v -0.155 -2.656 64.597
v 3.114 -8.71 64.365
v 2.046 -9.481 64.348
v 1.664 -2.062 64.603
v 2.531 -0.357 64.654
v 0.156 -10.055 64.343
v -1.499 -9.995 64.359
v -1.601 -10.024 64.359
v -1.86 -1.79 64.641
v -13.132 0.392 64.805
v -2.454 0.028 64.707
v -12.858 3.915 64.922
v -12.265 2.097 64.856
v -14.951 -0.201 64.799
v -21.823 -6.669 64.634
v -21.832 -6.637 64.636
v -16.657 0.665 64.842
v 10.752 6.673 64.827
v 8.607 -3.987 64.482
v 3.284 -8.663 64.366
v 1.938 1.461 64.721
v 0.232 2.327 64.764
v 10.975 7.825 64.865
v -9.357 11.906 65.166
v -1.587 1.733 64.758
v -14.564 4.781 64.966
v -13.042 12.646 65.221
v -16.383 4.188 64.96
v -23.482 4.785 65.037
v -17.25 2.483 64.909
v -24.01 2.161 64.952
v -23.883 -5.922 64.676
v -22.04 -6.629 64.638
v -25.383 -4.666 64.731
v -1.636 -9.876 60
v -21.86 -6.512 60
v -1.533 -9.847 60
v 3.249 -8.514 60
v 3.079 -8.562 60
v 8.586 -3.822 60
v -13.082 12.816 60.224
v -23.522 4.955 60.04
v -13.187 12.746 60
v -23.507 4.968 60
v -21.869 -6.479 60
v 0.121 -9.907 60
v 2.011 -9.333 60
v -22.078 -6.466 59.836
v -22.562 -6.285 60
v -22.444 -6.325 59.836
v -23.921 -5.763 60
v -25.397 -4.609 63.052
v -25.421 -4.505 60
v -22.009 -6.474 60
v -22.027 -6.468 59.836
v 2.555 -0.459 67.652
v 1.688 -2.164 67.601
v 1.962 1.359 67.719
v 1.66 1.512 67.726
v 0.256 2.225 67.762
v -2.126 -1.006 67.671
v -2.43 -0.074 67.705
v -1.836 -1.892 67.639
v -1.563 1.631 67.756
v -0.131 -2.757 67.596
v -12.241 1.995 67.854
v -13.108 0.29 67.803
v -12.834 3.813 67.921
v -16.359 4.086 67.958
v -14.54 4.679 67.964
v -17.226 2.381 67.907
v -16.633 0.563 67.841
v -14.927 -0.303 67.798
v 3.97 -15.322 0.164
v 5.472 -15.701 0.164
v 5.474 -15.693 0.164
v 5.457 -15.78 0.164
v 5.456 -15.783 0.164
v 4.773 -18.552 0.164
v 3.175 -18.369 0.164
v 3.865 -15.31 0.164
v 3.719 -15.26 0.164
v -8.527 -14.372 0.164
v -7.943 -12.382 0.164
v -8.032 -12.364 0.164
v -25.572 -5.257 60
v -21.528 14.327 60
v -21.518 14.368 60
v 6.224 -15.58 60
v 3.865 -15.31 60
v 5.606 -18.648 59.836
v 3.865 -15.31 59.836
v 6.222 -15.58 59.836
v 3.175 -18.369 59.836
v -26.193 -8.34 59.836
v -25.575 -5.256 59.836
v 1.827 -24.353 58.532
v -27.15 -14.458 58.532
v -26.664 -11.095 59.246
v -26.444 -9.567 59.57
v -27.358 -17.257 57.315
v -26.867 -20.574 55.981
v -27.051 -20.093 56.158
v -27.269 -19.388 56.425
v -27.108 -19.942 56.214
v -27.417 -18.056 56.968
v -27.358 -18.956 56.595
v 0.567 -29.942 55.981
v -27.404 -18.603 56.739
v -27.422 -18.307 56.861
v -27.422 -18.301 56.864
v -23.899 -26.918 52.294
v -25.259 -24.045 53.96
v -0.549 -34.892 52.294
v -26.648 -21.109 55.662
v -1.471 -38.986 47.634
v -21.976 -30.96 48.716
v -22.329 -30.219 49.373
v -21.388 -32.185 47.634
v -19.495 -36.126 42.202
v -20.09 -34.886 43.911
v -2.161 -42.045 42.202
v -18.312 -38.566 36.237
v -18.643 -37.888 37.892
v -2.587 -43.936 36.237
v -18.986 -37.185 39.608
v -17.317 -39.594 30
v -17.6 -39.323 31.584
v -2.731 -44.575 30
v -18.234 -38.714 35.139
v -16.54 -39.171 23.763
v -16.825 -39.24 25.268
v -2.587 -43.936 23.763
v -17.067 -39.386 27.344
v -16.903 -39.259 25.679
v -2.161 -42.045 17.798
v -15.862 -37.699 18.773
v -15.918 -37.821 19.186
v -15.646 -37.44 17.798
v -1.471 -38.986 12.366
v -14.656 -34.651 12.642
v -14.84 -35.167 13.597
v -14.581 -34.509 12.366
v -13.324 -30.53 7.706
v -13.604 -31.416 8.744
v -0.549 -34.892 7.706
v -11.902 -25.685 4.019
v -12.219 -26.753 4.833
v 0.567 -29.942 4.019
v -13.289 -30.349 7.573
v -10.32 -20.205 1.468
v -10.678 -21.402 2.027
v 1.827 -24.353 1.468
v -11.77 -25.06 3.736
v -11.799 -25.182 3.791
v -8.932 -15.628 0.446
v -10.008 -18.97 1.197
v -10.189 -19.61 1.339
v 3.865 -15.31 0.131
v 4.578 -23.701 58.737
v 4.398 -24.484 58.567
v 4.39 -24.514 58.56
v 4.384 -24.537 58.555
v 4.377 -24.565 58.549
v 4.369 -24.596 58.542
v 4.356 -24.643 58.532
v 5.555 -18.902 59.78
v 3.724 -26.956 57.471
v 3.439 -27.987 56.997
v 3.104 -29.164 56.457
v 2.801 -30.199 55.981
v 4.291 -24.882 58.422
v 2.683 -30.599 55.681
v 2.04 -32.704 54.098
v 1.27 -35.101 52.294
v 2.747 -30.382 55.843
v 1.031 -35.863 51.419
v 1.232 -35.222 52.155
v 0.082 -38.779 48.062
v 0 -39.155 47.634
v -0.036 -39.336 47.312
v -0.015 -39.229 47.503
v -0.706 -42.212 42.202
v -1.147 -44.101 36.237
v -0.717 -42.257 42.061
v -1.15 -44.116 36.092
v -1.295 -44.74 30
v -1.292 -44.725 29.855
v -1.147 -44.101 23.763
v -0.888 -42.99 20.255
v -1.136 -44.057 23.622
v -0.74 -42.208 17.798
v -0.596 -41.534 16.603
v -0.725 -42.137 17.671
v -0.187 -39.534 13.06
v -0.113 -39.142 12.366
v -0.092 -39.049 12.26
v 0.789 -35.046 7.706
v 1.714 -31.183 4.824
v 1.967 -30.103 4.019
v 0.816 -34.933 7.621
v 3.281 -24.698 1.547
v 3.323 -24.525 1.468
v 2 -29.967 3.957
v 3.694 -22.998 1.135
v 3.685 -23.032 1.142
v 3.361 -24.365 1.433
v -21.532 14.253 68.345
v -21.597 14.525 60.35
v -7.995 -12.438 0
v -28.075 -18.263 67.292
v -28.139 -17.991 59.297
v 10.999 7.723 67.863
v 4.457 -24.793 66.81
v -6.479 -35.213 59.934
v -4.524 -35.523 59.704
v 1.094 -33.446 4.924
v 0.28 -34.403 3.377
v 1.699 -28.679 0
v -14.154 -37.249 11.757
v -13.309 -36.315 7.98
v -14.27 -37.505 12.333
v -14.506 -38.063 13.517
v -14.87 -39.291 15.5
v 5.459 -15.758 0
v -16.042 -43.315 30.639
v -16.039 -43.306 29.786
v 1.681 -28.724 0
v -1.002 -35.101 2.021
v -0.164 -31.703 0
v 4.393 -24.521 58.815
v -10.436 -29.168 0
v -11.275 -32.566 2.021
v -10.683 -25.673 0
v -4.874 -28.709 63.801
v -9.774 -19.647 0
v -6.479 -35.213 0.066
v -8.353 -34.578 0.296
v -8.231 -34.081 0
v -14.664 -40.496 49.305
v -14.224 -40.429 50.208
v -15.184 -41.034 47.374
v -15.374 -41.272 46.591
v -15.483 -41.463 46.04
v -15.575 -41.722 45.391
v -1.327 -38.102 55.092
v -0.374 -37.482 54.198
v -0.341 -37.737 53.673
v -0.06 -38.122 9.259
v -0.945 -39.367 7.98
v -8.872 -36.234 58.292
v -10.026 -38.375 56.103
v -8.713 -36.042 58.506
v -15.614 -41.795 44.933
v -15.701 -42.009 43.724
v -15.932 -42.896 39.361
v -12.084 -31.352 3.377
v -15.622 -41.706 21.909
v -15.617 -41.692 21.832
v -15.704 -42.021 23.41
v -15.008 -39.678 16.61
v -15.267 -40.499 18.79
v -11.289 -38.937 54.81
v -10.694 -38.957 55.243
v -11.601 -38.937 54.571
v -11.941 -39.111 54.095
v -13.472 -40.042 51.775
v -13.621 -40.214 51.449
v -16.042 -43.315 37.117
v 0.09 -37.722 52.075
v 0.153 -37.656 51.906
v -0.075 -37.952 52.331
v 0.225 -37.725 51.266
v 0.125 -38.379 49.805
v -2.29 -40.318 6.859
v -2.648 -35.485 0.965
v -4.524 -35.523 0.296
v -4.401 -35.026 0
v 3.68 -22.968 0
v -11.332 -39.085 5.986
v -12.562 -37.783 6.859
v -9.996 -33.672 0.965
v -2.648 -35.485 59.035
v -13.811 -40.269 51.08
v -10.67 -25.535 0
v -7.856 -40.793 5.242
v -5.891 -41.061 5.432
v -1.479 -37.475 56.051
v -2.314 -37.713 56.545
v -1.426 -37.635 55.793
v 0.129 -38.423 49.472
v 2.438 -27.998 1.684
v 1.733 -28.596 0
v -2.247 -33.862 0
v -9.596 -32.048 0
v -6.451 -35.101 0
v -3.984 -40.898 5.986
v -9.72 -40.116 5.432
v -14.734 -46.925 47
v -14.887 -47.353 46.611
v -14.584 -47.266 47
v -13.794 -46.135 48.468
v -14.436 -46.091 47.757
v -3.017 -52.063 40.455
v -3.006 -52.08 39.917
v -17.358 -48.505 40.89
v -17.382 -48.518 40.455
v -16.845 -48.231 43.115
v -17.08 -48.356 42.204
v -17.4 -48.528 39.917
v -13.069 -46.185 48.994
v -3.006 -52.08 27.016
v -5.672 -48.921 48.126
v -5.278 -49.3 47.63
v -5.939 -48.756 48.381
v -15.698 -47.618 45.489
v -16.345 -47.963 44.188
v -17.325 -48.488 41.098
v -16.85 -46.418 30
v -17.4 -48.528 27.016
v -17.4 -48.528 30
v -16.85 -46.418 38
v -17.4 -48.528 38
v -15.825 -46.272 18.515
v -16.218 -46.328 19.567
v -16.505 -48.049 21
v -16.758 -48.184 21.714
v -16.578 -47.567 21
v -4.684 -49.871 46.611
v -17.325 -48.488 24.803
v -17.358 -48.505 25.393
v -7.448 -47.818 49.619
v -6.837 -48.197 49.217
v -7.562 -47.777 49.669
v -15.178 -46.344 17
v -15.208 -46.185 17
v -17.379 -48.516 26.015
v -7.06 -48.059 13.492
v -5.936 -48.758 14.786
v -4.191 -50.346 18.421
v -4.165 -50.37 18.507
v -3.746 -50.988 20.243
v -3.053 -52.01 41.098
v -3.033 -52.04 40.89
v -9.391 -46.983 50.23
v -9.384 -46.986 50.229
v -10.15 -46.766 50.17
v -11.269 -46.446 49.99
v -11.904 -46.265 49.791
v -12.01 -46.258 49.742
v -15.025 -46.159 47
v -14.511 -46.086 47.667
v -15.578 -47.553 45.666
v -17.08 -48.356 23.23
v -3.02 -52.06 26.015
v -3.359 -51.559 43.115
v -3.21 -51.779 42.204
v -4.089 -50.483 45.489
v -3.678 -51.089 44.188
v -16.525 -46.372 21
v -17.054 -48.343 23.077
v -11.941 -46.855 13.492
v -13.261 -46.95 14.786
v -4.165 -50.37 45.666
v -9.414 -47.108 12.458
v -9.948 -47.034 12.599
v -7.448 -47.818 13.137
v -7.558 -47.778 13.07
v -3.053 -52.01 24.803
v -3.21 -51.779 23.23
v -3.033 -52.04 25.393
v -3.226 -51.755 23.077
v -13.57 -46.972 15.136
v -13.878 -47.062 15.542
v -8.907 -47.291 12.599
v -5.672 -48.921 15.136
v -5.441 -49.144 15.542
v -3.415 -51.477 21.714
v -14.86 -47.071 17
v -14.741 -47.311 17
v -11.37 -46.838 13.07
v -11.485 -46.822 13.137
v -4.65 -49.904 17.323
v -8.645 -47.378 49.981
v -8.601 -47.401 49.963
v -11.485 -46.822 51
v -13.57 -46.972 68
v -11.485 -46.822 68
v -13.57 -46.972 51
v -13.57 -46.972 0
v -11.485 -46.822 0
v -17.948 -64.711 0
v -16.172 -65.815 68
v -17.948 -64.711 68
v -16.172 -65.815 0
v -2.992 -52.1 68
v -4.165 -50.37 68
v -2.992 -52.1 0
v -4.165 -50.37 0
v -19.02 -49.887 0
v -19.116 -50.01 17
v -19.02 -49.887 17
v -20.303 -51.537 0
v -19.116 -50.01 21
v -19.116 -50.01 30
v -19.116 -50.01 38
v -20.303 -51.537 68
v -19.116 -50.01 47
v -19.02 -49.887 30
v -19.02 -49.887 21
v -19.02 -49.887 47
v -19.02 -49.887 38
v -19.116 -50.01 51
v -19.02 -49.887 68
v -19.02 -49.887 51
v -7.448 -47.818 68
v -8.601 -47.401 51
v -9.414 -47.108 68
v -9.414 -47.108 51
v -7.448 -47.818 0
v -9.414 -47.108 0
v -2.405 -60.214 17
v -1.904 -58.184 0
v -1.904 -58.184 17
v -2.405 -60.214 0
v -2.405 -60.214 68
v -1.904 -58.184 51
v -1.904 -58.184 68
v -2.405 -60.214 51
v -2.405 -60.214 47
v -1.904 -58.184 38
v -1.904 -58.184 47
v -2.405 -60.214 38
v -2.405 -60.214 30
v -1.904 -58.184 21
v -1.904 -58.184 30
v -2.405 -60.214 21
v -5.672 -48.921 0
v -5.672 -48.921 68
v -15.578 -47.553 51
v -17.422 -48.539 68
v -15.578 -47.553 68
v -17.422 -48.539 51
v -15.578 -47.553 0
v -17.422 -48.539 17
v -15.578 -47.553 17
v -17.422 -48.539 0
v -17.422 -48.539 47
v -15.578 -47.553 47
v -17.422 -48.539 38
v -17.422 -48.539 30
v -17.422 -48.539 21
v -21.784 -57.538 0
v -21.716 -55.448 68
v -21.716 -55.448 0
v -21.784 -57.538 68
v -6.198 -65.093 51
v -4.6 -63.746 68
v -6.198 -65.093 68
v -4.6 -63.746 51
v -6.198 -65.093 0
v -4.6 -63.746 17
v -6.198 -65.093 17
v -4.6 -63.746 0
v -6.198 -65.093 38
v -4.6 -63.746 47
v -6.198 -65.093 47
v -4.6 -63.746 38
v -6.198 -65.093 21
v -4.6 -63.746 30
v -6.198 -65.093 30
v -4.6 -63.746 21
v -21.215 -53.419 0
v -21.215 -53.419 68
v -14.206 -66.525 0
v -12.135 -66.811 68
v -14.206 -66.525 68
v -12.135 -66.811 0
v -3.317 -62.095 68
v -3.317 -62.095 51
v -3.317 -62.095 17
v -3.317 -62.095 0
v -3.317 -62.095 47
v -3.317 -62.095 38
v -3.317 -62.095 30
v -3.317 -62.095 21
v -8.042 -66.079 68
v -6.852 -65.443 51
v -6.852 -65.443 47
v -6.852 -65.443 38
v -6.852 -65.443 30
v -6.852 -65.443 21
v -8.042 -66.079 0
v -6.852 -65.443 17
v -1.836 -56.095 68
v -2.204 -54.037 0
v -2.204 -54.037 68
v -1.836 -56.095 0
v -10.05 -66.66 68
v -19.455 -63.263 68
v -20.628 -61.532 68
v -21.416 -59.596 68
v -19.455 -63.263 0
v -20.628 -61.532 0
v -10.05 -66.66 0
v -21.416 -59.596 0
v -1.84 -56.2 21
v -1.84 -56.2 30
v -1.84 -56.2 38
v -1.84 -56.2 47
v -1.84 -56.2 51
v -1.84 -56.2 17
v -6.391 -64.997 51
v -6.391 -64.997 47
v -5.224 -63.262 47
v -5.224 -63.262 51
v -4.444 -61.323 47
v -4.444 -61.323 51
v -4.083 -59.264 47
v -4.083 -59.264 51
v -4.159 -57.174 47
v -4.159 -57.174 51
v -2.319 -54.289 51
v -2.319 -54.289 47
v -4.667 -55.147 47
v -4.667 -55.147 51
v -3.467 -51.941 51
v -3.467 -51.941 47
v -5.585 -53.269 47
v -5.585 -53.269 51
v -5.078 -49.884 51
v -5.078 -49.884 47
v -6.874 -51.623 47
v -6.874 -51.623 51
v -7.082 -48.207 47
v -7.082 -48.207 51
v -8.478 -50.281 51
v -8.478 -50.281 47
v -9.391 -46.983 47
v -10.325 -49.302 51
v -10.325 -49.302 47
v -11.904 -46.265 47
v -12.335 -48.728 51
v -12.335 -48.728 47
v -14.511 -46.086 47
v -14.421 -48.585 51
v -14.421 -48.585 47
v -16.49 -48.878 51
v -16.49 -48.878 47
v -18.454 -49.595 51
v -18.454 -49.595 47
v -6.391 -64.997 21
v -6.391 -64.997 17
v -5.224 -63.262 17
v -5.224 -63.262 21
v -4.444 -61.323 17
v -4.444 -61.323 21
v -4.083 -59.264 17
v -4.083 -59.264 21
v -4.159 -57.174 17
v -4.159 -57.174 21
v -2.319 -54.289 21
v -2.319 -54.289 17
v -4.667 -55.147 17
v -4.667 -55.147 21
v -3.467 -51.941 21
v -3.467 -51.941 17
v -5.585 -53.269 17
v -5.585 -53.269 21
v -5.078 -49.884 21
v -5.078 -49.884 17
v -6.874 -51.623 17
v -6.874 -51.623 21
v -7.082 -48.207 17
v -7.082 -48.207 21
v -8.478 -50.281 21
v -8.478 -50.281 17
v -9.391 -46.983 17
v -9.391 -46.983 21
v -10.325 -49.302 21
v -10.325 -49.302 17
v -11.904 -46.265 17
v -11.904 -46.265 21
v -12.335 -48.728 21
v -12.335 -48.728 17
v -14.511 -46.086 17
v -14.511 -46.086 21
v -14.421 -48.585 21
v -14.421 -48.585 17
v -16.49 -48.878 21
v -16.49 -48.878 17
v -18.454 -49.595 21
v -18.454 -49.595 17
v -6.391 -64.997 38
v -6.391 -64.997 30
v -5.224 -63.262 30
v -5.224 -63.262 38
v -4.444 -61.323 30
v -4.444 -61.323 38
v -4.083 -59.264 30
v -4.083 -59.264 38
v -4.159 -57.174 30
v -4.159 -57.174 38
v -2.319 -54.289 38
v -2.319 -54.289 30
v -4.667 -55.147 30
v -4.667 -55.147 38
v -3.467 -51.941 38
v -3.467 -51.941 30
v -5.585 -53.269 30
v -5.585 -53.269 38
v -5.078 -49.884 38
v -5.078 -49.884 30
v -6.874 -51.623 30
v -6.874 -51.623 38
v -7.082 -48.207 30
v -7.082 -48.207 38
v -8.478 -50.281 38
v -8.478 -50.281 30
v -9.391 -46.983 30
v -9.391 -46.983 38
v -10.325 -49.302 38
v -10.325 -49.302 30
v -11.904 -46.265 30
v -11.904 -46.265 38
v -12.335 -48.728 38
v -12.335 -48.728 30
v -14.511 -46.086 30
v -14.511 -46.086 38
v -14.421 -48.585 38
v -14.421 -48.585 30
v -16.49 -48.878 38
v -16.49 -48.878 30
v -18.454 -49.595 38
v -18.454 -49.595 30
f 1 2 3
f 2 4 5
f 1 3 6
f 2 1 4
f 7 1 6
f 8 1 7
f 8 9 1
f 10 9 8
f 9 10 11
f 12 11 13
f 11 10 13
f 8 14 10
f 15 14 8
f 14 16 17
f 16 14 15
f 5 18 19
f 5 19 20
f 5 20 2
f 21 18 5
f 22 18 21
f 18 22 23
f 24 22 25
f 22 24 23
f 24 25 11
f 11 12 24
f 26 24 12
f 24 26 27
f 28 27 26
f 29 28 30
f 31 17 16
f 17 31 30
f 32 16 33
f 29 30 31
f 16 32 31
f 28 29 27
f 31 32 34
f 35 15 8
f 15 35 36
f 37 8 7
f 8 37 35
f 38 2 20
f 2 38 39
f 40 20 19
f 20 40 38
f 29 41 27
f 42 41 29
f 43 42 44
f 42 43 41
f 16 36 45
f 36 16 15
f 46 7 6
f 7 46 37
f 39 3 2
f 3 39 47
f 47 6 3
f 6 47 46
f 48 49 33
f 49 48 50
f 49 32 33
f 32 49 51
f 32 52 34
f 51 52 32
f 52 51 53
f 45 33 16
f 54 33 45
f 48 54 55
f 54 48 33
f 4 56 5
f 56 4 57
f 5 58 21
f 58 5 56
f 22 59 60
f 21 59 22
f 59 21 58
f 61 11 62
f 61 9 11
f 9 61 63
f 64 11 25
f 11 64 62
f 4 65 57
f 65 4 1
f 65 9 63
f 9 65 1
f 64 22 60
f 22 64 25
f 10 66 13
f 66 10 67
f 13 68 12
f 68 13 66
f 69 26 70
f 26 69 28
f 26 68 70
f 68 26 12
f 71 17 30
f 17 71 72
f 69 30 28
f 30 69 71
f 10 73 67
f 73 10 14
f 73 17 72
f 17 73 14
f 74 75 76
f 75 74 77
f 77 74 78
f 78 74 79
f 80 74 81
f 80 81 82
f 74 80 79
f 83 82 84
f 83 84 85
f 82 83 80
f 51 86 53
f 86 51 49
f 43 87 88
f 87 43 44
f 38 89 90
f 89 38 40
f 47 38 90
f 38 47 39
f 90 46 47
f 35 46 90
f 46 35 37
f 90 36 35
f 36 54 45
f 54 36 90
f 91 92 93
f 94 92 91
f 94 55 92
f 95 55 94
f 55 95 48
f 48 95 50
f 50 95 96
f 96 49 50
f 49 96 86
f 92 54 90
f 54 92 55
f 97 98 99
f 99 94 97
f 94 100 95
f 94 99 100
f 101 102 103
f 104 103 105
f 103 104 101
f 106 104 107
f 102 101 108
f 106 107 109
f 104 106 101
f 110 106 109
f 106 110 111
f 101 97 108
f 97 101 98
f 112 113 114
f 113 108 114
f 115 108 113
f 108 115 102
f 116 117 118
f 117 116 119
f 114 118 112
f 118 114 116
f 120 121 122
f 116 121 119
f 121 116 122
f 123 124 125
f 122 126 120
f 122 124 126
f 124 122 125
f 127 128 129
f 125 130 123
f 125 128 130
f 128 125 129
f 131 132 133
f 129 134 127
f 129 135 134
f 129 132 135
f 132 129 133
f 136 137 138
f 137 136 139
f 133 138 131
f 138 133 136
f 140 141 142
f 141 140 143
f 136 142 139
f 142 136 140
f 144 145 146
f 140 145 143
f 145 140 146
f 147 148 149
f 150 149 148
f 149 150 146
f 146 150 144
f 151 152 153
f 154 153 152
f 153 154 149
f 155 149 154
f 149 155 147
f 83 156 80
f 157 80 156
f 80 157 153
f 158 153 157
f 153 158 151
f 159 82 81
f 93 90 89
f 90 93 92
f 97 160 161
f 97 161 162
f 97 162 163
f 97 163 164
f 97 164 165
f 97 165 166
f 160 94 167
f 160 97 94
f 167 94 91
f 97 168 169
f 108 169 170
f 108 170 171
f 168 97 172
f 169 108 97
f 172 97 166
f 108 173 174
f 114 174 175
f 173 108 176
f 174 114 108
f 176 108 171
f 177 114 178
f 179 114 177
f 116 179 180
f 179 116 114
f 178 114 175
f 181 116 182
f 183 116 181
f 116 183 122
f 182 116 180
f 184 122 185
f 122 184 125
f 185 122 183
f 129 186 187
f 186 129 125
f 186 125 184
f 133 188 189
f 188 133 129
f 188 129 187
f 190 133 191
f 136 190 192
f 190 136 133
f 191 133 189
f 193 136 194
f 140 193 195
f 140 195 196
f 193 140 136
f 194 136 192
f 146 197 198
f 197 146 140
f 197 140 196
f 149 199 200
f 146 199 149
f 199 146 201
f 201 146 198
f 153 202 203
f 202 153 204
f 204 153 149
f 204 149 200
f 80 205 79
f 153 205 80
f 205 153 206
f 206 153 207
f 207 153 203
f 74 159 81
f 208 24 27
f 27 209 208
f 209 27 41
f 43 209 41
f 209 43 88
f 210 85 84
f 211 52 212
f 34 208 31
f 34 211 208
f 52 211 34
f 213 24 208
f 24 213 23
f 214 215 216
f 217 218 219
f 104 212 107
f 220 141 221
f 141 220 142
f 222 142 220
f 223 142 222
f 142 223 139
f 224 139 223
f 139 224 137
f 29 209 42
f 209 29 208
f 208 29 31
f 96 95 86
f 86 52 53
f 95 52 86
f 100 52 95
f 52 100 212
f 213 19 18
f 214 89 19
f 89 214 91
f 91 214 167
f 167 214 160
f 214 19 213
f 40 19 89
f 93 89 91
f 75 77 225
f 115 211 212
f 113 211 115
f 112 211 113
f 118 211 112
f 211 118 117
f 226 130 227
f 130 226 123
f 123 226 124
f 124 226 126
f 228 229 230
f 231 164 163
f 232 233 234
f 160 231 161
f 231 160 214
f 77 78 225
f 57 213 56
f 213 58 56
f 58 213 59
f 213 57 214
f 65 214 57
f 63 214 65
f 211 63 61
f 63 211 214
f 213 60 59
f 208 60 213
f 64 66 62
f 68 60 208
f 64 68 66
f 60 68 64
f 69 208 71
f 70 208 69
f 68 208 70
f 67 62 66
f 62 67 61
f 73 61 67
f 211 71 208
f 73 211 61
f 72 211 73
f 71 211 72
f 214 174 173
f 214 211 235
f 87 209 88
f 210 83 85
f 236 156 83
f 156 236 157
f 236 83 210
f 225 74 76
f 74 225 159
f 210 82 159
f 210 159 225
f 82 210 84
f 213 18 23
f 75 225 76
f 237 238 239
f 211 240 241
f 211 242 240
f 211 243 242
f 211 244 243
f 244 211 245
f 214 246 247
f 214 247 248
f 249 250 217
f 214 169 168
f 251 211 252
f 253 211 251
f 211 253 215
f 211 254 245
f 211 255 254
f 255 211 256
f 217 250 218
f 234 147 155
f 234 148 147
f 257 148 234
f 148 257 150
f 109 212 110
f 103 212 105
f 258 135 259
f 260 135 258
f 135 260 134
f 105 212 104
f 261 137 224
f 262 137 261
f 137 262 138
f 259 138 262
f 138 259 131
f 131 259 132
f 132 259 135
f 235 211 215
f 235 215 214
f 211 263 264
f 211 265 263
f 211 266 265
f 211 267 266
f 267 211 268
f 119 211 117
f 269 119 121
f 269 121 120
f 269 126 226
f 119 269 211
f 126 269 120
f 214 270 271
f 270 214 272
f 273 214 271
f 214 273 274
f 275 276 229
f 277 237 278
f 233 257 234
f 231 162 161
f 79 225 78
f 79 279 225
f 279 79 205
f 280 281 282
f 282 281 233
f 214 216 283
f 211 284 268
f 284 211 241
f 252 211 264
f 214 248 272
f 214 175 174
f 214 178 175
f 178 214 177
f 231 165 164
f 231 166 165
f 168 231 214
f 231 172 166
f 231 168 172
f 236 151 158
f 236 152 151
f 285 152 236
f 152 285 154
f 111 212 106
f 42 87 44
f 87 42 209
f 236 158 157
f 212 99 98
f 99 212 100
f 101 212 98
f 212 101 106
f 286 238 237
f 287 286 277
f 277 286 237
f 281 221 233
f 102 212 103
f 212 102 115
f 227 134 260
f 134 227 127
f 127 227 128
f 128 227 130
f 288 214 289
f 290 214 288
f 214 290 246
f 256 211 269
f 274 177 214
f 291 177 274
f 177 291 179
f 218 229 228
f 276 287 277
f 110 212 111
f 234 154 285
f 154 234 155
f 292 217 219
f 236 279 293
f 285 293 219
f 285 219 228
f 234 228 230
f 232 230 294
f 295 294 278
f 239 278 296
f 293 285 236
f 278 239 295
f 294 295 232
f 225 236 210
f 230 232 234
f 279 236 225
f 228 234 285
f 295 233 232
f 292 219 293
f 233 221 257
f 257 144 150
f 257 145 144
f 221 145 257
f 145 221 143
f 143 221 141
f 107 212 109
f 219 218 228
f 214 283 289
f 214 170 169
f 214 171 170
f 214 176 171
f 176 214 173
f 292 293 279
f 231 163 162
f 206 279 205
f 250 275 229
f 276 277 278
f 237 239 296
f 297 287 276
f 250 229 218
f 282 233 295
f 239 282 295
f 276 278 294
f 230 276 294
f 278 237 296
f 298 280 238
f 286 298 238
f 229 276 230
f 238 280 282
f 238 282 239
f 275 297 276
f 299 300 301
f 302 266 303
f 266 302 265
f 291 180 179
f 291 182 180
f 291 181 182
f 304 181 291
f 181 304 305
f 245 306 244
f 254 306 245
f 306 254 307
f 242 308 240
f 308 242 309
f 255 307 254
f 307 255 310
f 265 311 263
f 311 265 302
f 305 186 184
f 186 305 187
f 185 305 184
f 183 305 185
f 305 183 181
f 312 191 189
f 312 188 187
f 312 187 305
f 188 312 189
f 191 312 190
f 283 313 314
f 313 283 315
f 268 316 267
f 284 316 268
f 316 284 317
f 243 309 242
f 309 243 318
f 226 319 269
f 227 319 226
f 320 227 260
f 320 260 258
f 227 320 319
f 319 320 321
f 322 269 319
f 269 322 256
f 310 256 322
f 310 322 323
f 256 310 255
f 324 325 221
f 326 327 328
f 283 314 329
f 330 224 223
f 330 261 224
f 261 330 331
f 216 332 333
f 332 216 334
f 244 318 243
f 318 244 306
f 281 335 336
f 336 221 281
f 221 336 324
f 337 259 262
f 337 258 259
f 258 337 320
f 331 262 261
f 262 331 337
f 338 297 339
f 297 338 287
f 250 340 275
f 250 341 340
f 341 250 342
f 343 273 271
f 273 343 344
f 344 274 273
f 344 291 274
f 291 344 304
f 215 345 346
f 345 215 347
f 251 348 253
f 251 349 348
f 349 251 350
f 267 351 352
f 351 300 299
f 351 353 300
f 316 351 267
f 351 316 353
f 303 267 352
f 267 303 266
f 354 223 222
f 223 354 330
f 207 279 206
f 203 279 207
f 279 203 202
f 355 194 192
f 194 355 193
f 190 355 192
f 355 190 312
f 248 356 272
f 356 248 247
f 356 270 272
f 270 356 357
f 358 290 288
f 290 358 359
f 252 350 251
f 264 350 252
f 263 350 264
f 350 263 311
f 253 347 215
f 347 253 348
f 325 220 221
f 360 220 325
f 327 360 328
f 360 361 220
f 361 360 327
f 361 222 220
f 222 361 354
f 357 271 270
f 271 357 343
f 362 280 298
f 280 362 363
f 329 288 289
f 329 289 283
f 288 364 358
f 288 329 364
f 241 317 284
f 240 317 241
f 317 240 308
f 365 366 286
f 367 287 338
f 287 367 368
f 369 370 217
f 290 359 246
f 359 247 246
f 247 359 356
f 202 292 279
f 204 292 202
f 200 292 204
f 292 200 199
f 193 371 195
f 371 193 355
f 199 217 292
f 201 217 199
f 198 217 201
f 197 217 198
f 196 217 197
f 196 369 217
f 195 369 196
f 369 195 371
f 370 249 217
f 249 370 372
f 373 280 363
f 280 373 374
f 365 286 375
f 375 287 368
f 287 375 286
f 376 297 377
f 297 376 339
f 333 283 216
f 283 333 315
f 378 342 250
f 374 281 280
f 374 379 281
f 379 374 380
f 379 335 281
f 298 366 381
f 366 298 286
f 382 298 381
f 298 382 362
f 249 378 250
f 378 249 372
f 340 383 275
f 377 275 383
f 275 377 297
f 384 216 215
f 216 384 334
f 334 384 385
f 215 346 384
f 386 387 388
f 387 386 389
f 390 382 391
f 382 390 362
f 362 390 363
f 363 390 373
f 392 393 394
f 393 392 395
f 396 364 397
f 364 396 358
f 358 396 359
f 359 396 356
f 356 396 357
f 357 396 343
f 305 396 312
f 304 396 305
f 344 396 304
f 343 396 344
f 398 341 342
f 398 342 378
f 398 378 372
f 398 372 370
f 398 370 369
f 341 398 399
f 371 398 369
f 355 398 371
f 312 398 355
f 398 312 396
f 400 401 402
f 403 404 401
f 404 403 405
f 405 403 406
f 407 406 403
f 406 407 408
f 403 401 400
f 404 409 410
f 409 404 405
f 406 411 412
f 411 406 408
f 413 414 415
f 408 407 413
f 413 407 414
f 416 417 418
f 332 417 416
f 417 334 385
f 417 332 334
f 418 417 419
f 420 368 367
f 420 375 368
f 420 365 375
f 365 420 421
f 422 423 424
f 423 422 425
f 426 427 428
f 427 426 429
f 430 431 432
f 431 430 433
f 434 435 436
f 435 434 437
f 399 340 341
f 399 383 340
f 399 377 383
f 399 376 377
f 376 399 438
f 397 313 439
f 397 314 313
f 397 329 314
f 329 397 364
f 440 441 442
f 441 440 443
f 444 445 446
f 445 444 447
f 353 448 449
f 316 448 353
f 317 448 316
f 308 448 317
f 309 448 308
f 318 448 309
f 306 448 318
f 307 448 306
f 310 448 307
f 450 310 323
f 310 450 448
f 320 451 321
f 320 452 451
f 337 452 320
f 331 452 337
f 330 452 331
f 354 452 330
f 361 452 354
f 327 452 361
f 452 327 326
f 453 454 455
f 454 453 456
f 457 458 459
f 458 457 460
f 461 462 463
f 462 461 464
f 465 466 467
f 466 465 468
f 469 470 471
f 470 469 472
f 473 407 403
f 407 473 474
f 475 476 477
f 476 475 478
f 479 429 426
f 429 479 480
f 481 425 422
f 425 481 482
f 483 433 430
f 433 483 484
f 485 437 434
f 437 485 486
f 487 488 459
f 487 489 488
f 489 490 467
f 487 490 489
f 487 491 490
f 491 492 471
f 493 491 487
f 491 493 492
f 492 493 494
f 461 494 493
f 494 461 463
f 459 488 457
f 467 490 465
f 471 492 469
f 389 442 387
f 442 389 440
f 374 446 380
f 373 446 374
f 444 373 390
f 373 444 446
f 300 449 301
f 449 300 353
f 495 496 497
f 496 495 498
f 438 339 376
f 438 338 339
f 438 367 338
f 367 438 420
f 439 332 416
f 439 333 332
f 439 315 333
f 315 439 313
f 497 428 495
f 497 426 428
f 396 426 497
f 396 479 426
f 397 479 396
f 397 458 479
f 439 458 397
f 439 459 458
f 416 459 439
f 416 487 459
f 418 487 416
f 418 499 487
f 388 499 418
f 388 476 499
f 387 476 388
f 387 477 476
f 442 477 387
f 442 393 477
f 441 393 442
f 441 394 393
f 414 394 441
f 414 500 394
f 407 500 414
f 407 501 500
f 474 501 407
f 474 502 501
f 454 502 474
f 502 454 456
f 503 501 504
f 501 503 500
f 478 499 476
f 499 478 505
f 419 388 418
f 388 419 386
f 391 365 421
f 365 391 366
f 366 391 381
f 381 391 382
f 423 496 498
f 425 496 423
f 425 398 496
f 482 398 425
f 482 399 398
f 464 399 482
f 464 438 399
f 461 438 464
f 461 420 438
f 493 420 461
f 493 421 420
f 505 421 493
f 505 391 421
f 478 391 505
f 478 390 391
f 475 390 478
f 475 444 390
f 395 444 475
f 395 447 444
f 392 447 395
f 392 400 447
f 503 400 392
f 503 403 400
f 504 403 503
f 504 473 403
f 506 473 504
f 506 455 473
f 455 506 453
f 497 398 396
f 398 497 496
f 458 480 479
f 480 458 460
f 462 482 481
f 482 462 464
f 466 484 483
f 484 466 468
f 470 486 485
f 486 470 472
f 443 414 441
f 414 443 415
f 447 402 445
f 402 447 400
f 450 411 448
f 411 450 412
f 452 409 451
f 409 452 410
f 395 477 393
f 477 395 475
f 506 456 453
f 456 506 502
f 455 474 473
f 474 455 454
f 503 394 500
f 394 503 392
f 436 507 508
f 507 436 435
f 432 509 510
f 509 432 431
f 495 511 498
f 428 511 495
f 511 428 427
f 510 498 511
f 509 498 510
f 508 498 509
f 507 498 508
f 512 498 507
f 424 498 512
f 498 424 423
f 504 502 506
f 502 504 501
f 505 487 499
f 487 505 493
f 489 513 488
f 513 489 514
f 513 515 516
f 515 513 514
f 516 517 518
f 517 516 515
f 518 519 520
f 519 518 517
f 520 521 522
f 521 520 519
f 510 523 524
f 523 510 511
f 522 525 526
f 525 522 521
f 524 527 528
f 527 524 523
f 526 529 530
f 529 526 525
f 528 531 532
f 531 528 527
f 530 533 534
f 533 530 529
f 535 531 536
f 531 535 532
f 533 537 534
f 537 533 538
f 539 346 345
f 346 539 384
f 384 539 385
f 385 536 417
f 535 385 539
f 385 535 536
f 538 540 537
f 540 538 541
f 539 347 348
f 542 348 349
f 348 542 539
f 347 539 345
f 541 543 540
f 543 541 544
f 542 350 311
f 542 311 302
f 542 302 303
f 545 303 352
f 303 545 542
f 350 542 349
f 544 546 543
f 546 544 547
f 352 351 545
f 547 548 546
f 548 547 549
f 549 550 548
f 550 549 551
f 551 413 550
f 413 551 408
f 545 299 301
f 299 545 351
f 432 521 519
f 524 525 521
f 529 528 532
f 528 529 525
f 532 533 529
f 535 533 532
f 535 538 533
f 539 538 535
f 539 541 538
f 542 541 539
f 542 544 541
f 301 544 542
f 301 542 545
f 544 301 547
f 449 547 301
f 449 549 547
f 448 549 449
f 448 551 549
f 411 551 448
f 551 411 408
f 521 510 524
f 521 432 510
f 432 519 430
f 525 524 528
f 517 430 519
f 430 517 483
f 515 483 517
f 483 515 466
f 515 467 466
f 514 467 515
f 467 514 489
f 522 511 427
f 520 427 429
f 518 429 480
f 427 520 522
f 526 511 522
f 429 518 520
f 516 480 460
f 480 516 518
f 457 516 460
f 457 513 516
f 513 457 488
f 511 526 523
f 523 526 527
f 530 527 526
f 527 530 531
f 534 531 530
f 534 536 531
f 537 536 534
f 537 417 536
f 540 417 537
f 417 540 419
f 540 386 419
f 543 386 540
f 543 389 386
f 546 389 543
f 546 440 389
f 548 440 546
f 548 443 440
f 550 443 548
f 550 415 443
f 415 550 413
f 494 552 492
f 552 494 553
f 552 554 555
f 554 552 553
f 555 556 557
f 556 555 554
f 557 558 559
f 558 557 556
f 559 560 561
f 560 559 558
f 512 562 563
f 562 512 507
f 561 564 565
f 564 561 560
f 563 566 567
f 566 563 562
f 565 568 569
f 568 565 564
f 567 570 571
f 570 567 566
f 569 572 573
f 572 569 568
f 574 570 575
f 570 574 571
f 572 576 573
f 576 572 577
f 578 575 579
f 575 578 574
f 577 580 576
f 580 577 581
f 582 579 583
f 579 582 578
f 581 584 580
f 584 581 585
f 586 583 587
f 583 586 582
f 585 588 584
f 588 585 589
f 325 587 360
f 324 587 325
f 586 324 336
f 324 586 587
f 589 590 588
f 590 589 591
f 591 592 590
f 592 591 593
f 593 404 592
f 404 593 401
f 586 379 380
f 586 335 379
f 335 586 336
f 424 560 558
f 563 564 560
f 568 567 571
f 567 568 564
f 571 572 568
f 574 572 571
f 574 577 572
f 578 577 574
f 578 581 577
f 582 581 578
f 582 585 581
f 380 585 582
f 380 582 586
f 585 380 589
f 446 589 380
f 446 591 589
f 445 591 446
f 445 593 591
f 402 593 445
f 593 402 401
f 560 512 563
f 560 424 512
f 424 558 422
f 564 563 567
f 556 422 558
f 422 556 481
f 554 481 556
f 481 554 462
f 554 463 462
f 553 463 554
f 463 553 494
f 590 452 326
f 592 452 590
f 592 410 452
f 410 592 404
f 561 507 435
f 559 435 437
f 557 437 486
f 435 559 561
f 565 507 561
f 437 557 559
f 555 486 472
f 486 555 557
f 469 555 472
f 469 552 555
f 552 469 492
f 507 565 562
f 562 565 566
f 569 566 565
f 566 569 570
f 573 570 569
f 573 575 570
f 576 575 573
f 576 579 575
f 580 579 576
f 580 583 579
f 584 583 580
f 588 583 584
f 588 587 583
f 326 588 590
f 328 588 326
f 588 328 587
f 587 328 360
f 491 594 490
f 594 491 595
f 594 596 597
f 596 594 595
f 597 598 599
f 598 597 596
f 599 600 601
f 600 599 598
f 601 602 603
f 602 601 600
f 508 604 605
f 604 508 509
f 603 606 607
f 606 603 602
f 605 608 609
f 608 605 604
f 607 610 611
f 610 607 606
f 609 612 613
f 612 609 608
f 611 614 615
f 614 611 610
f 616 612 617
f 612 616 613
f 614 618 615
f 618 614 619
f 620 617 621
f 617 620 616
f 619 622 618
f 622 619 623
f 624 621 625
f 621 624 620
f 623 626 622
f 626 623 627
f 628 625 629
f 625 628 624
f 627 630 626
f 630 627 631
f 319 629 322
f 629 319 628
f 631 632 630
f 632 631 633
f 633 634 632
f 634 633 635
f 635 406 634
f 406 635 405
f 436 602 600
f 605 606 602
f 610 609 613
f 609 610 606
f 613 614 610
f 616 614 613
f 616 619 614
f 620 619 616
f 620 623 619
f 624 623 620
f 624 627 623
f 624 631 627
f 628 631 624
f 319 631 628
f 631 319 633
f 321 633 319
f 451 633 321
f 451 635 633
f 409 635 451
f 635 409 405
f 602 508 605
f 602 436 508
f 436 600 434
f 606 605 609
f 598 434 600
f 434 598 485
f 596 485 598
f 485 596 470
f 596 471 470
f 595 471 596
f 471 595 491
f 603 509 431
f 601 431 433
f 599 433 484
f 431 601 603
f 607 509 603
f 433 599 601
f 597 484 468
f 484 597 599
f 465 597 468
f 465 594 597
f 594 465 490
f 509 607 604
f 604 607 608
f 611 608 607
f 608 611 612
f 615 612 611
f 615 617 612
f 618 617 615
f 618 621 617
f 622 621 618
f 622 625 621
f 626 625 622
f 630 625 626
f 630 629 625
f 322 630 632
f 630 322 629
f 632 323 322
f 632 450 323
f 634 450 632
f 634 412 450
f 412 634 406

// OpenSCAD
// file: bezier.scad
// bezier_deltat determines the stepsize of the 'running variable' t below.
// The smaller the step the smoother the curve.
// Since the default of $fn is zero we the min below makes sure that
// the functions below remain working if $fn is not set explicitly.
bezier_deltat = min(0.1,1/$fn);

// Quadratic Bezier formula
// B(t)=(1-t)(1-t)p0+2(1-t)(t)p1+(t)(t)p2
// Would be possible w/o concat since OpenSCAD 2019.05
function bezier(p0,p1,p2) = concat([for (t=[0:bezier_deltat:1]) pow(1-t,2)*p0+2*(1-t)*t*p1+pow(t,2)*p2],[p2]);
// file: utils.scad
// https://stackoverflow.com/a/45826244/1905491
// rotate as per a, v, but around point pt
module rotate_about_pt(a, v, pt) {
    translate(pt)
        rotate(a,v)
            translate(-pt)
                children();   
}
// file: mud_common.scad
// overridable global functions/variables
function is_holder_front_facing() = 0;

mud_screw_head_h_extra=5; // Make sunk screws in bracket (if mud_strut_rotation_edge is >~3°)
function mud_screw_off_y()=2*holder_wall-mud_strut_thick;
function holder_rect_height()=holder_rect_width;
function holder_bracket_off_r()=0;

////////////////////////////////////////////////////////////////////////
// Holder common
holder_wall = 4;
tie_w_center=8;
tie_w=4;
tie_h=2.5;
tie_gap=15;

// Holder beam
holder_beam_d = 20;
holder_beam_inwards_off = 2*holder_wall;
holder_beam_h = mud_d+holder_beam_inwards_off;

// Holder arc
mud_strut_extra_thick=10;
holder_arc_width = 14;
w = tan(holder_arc_angle_quirk)*mud_strut_screw_r;
x = holder_arc_width/2;
y = cos(holder_arc_angle()-45)*mud_strut_back_hole_dist;
holder_rect_width = 2*w + 2*x + y;

module holder_rotation(orbit) {
  rotate_about_pt(holder_arc_angle(),[0,1,0],[mud_axle_x,0,-mud_axle_z]) // Rotate to final location
    translate([-orbit, 0, 0]) // Move to correct "orbit"
      translate([mud_axle_x,0,-mud_axle_z]) // Move to axle
        children();
}

module holder_arc () {
  arc_extent_angle=180;
  holder_rotation(mud_axle_r-mud_d/2)
    intersection() { // Prevent bleeding on the outer side
      translate([0, -mud_d/2+holder_arc_width/2,0])
        cube([mud_d+holder_arc_width, mud_d+holder_arc_width,holder_arc_width],true);

      translate([0, -mud_d/2, -holder_arc_width/2]) // Move arc to correct y location and z-center on origin
        rotate([0,0,270-arc_extent_angle,]) // Fix coordinate system
            rotate_extrude(angle = arc_extent_angle, convexity = 10) // Create arc_extent_angle° arc
              translate([mud_d/2, holder_arc_width/2, 0]) // Move half-circle to arc's "orbit"
                union() {
                  intersection() { // Create half-circle
                    translate([holder_arc_width/2,0,0])
                      square([holder_arc_width, holder_arc_width],center=true);
                    circle(d=holder_arc_width);
                  }
                }
    }
}

module holder_bracket () {
  holder_rotation(mud_strut_screw_r)
    translate([holder_bracket_off_r(), 0, 0]) // 
      translate([0, 0, holder_arc_width/2]) // Offset to match the arcs front facing border (later)
        translate([-holder_rect_height(), 0, -holder_rect_width]) // Move corner to origin
          cube([holder_rect_height(), 2*holder_wall, holder_rect_width]);
}

module tie_channel (h=tie_h, w=tie_w, off_h=0) {
  translate([0, +w/2-off_h, 0]) // Center
    holder_beam_translation()
      rotate([0,-holder_arc_angle()+(is_holder_front_facing()?180:0),0])
        translate([-holder_beam_d/7, 0, 0]) // Nudge into the beam
          rotate([180,90,90]) // Fix coordinate system
            rotate_extrude(angle = 360, convexity = 2) 
              translate([holder_beam_d/2, 0, 0]) // Move to "orbit"
                square([h, w]);
}

module holder_beam_translation() {
  holder_rotation(mud_axle_r+holder_beam_d/2+holder_wall)
    translate([0, -holder_beam_h/2+holder_beam_inwards_off, 0]) // Move to correct y location
      children();
}

module tie_channels (h=tie_h, w=tie_w, gap_percent=200) {
  tie_channel(h=tie_h, w=tie_w_center);
  for (o=[-tie_gap, tie_gap]) {
    tie_channel(h=tie_h, w=tie_w, off_h=o);
  }
}

module holder_beam (h, d) {
  holder_beam_translation()
    rotate([90,0,0]) // Fix coordinate system
      cylinder(d=d, h=h, center=true);
}

module holder () {
  difference () {
    union() {
      hull() {
        strut_rotation()
          holder_bracket();
        holder_arc();
      }
      hull() {
        holder_arc();
        holder_beam(holder_beam_h/16, holder_beam_d*3/4);
      }
      holder_beam(holder_beam_h, holder_beam_d);
    }
    tie_channels();
  }
}

module high_infill_screws (off=0) {
  mud_strut_holes(d=4*mud_strut_hole_d, h_add=mud_screw_off_y());
}

module translate_result_base() {
  if (outer_is_base) {
    translate([0, 0, holder_beam_h])
      rotate([+90,0,holder_arc_angle()])
        children();
  } else {
    rotate([-90,0,holder_arc_angle()])
      strut_rotation(1)
        children();
  }
}

module translate_result() {
  translate_result_base()
    translate([result_x_off, -2*holder_wall, result_z_off])
        children();
}

module translate_bike() {
  translate_result() children();
}

module norm_infill () {
  difference() {
    translate_result()
      holder();
    bike();
  }
}

module high_infill () {
  intersection() {
    norm_infill();
    translate_result() {
      rotate([0, mud_strut_rotation_y, 0])
        high_infill_screws();
    }
  }
}
// main file
// $fn=20;
// $fn=50;
// $fn=200;

// is_left = 1;
// is_high_infill = 1;

outer_is_base=1;

include <common.scad>;

holder_arc_angle_quirk=0.5;
holder_arc_off_x=mud_axle_x;
holder_arc_off_z=mud_axle_z;
function holder_arc_angle() = atan(holder_arc_off_z/holder_arc_off_x)+holder_arc_angle_quirk;

result_x_off=0;
result_z_off=0;

include <mud_common.scad>;

function holder_bracket_off_r()=10;
function is_holder_front_facing()=0;
